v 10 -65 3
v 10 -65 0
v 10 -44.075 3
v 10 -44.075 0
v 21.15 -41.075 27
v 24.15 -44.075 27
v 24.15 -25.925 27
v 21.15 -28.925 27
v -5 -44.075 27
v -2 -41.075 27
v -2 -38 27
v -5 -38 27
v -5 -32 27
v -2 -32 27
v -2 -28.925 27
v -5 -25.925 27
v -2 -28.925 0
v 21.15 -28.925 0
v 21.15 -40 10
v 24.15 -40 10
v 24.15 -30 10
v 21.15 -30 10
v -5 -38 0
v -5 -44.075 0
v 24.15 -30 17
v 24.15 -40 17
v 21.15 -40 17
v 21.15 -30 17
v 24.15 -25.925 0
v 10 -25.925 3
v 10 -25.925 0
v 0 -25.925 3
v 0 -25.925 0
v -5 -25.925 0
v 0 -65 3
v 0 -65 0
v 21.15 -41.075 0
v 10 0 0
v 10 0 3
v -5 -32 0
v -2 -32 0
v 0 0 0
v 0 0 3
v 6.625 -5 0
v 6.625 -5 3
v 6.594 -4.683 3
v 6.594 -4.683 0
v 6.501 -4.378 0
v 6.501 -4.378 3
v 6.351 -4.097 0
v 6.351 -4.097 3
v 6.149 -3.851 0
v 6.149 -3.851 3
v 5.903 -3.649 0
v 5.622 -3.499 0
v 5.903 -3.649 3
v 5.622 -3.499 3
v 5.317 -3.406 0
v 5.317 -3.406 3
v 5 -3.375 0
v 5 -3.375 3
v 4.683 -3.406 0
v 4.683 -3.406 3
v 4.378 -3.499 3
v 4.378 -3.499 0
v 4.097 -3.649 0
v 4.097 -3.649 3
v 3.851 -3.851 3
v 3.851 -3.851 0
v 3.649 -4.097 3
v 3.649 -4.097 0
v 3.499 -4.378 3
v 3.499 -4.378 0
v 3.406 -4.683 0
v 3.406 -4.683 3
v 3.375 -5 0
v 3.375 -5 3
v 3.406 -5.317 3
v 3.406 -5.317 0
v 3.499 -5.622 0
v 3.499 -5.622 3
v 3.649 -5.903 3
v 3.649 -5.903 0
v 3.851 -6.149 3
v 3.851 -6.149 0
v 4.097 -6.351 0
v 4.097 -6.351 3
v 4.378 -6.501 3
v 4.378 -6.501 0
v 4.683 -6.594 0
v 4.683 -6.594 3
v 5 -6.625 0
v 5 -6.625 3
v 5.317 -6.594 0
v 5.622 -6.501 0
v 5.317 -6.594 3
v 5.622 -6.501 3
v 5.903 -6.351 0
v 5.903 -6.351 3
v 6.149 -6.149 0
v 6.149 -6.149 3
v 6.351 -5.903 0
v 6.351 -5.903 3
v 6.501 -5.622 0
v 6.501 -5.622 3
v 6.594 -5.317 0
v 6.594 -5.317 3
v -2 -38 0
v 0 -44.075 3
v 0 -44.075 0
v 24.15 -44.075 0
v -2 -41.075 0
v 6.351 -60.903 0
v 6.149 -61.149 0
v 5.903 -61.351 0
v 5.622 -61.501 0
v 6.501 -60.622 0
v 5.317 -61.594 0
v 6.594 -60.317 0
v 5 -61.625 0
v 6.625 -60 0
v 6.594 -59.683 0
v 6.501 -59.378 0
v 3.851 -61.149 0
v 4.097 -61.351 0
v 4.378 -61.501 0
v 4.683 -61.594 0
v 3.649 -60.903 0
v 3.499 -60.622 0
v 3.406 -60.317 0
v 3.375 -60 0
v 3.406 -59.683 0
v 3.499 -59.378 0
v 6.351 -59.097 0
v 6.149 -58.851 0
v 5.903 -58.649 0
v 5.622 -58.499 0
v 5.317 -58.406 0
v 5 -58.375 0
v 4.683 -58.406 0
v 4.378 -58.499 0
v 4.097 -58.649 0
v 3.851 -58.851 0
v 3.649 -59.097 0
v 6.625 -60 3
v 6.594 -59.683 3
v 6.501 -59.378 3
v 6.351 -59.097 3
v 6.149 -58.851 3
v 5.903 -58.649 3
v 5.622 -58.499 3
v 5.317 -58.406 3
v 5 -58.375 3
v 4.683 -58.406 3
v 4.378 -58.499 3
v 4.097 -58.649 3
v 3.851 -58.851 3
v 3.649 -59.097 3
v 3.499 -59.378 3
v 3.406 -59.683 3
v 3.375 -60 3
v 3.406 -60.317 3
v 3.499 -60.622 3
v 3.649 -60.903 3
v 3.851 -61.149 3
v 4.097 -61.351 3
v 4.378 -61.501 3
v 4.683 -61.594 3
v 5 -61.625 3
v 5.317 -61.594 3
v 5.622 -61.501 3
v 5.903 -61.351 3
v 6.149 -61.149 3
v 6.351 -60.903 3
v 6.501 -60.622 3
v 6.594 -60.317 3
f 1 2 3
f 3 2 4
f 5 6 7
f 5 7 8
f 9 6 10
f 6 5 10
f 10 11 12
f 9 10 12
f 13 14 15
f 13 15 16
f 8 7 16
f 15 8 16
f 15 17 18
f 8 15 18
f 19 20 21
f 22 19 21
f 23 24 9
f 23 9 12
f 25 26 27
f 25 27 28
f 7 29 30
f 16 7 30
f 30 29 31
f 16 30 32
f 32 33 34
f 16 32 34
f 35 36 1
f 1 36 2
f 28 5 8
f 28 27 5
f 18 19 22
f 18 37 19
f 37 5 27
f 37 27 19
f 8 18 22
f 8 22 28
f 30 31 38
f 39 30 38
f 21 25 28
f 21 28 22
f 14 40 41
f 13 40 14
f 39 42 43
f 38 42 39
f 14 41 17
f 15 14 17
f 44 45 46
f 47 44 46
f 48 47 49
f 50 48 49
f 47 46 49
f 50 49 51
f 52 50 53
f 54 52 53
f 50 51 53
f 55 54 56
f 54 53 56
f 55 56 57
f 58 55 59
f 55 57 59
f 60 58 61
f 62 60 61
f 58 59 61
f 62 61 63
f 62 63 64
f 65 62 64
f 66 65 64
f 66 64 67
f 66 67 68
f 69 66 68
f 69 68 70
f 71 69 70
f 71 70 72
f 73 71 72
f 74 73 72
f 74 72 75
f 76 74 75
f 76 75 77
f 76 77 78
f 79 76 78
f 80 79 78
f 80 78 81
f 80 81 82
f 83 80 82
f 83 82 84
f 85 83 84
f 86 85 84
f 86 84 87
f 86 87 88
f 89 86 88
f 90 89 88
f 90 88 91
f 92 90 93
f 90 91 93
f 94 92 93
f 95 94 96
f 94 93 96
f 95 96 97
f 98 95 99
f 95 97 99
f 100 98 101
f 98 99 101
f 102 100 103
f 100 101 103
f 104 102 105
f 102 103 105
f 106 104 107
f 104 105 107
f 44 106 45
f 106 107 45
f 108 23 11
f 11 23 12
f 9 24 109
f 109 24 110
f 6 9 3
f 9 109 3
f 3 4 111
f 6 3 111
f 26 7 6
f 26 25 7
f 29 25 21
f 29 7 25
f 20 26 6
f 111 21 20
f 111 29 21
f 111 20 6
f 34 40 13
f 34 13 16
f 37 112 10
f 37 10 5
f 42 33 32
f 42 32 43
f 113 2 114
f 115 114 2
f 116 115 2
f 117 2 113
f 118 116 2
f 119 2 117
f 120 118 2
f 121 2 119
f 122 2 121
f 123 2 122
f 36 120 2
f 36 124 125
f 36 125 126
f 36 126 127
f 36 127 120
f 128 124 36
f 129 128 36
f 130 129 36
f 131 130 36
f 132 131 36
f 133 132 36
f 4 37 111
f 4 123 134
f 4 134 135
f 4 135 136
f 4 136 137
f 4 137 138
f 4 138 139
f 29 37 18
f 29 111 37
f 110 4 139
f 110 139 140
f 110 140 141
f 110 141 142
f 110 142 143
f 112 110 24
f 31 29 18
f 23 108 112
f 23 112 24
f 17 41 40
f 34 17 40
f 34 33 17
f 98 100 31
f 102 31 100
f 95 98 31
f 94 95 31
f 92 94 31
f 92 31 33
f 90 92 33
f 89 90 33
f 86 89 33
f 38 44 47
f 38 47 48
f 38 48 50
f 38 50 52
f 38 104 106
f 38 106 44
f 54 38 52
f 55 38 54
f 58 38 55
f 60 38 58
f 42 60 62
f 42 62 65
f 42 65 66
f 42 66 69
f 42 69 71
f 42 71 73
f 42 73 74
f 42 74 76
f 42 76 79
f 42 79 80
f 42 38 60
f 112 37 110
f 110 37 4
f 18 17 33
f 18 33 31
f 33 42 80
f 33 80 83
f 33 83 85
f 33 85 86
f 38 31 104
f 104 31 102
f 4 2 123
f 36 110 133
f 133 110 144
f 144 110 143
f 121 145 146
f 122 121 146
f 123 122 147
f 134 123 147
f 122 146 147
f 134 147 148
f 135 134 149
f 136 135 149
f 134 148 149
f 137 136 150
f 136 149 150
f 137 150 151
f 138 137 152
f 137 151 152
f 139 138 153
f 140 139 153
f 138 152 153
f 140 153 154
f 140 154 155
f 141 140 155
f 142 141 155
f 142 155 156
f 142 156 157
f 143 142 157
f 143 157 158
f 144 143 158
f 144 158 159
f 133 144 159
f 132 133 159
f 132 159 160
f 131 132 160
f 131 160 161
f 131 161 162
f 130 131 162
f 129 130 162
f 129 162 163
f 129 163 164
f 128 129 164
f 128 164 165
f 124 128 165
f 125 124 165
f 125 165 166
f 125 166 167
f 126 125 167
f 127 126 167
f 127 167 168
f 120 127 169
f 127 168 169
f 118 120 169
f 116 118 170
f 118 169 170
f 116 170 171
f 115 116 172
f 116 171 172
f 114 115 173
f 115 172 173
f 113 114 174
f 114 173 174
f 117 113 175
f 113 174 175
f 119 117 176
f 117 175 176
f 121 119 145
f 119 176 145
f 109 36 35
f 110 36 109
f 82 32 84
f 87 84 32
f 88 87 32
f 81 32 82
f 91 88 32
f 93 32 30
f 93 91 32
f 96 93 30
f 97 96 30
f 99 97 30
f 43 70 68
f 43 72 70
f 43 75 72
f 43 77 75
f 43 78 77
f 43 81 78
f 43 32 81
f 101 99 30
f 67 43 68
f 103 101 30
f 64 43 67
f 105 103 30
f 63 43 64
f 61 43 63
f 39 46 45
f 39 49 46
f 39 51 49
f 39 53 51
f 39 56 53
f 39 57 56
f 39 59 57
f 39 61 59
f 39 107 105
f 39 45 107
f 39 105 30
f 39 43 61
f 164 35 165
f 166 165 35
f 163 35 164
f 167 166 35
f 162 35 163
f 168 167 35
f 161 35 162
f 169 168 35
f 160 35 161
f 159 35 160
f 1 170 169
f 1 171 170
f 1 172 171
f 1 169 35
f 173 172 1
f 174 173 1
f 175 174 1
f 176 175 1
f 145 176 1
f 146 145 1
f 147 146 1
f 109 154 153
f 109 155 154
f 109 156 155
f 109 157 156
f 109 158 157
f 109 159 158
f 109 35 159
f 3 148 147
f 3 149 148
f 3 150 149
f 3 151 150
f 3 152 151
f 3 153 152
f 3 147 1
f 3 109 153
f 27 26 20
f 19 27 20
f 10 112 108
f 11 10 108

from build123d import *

# Parameters (mm, degrees)
ESQUISSE1_W                = 10
ESQUISSE1_H                = 20.925
BOSS_EXTRU_1_DEPTH         = 3
ESQUISSE1_H_2              = 25.925
BOSS_EXTRU_1_2_DEPTH       = 3
ESQUISSE1_3_W              = 23.15
ESQUISSE1_3_H              = 12.15
BOSS_EXTRU_2_DEPTH         = 27
ESQUISSE3_R                = 1.625
ENL_V_MAT_EXTRU_2_DEPTH    = 74.377261464
R_P_TITION_LIN_AIRE1_COUNT = 2
R_P_TITION_LIN_AIRE1_PITCH = 55
ESQUISSE5_W                = 27
ESQUISSE5_H                = 6
ENL_V_MAT_EXTRU_3_DEPTH    = 10
ENL_V_MAT_EXTRU_4_REACH    = 78.182
ESQUISSE6_W                = 7
ESQUISSE6_H                = 10


with BuildPart() as part:
    # Esquisse1 → Boss.-Extru.1 (new body)
    with BuildSketch(Plane.XY):
        with Locations((5, -54.5375)):
            Rectangle(ESQUISSE1_W, ESQUISSE1_H)
    extrude(amount=BOSS_EXTRU_1_DEPTH)



with BuildPart() as body_2:
    # Esquisse1 → Boss.-Extru.1 2 (new body)
    with BuildSketch(Plane.XY):
        with Locations((5, -12.9625)):
            Rectangle(ESQUISSE1_W, ESQUISSE1_H_2)
    extrude(amount=BOSS_EXTRU_1_2_DEPTH)


with BuildPart() as part_1:
    add(part.part)

    add(body_2.part)  # Boss.-Extru.2 merges body 2
    # Esquisse1<3> → Boss.-Extru.2 (add)
    with BuildSketch(Plane.XY):
        Polygon((0, -44.075), (10, -44.075), (24.15, -44.075), (24.15, -25.925), (10, -25.925), (0, -25.925), (-5, -25.925), (-5, -44.075), align=None)
        with Locations((9.575, -35)):
            Rectangle(ESQUISSE1_3_W, ESQUISSE1_3_H, mode=Mode.SUBTRACT)
    extrude(amount=BOSS_EXTRU_2_DEPTH)

    # Esquisse3 → Enlèv. mat.-Extru.2 (cut, through all)
    with BuildSketch(Plane.XY.offset(3)):
        with Locations((5, -5)):
            Circle(ESQUISSE3_R)
    enl_v_mat_extru_2 = extrude(amount=-ENL_V_MAT_EXTRU_2_DEPTH, mode=Mode.SUBTRACT)

    # Répétition linéaire1: Enlèv. mat.-Extru.2 ×2
    with Locations(*[(0, -i * R_P_TITION_LIN_AIRE1_PITCH, 0) for i in range(1, R_P_TITION_LIN_AIRE1_COUNT)]):
        add(enl_v_mat_extru_2, mode=Mode.SUBTRACT)

    # Esquisse5 → Enlèv. mat.-Extru.3 (cut)
    with BuildSketch(Plane.ZY.offset(5)):
        with Locations((13.5, -35)):
            Rectangle(ESQUISSE5_W, ESQUISSE5_H)
    extrude(amount=-ENL_V_MAT_EXTRU_3_DEPTH, mode=Mode.SUBTRACT)

    # Esquisse6 → Enlèv. mat.-Extru.4 (cut, up to next)
    with BuildSketch(Plane(origin=(24.15, 0, 0), x_dir=(0, 0, -1), z_dir=(1, 0, 0)), mode=Mode.PRIVATE) as enl_v_mat_extru_4_sk1:
        with Locations((-13.5, -35)):
            Rectangle(ESQUISSE6_W, ESQUISSE6_H)
    enl_v_mat_extru_4_tool1 = extrude(enl_v_mat_extru_4_sk1.sketch, amount=-ENL_V_MAT_EXTRU_4_REACH, mode=Mode.PRIVATE) & part_1.part
    add(enl_v_mat_extru_4_tool1.solids().sort_by_distance((24.15, -35, 13.5))[0], mode=Mode.SUBTRACT)


solid = part_1.part
